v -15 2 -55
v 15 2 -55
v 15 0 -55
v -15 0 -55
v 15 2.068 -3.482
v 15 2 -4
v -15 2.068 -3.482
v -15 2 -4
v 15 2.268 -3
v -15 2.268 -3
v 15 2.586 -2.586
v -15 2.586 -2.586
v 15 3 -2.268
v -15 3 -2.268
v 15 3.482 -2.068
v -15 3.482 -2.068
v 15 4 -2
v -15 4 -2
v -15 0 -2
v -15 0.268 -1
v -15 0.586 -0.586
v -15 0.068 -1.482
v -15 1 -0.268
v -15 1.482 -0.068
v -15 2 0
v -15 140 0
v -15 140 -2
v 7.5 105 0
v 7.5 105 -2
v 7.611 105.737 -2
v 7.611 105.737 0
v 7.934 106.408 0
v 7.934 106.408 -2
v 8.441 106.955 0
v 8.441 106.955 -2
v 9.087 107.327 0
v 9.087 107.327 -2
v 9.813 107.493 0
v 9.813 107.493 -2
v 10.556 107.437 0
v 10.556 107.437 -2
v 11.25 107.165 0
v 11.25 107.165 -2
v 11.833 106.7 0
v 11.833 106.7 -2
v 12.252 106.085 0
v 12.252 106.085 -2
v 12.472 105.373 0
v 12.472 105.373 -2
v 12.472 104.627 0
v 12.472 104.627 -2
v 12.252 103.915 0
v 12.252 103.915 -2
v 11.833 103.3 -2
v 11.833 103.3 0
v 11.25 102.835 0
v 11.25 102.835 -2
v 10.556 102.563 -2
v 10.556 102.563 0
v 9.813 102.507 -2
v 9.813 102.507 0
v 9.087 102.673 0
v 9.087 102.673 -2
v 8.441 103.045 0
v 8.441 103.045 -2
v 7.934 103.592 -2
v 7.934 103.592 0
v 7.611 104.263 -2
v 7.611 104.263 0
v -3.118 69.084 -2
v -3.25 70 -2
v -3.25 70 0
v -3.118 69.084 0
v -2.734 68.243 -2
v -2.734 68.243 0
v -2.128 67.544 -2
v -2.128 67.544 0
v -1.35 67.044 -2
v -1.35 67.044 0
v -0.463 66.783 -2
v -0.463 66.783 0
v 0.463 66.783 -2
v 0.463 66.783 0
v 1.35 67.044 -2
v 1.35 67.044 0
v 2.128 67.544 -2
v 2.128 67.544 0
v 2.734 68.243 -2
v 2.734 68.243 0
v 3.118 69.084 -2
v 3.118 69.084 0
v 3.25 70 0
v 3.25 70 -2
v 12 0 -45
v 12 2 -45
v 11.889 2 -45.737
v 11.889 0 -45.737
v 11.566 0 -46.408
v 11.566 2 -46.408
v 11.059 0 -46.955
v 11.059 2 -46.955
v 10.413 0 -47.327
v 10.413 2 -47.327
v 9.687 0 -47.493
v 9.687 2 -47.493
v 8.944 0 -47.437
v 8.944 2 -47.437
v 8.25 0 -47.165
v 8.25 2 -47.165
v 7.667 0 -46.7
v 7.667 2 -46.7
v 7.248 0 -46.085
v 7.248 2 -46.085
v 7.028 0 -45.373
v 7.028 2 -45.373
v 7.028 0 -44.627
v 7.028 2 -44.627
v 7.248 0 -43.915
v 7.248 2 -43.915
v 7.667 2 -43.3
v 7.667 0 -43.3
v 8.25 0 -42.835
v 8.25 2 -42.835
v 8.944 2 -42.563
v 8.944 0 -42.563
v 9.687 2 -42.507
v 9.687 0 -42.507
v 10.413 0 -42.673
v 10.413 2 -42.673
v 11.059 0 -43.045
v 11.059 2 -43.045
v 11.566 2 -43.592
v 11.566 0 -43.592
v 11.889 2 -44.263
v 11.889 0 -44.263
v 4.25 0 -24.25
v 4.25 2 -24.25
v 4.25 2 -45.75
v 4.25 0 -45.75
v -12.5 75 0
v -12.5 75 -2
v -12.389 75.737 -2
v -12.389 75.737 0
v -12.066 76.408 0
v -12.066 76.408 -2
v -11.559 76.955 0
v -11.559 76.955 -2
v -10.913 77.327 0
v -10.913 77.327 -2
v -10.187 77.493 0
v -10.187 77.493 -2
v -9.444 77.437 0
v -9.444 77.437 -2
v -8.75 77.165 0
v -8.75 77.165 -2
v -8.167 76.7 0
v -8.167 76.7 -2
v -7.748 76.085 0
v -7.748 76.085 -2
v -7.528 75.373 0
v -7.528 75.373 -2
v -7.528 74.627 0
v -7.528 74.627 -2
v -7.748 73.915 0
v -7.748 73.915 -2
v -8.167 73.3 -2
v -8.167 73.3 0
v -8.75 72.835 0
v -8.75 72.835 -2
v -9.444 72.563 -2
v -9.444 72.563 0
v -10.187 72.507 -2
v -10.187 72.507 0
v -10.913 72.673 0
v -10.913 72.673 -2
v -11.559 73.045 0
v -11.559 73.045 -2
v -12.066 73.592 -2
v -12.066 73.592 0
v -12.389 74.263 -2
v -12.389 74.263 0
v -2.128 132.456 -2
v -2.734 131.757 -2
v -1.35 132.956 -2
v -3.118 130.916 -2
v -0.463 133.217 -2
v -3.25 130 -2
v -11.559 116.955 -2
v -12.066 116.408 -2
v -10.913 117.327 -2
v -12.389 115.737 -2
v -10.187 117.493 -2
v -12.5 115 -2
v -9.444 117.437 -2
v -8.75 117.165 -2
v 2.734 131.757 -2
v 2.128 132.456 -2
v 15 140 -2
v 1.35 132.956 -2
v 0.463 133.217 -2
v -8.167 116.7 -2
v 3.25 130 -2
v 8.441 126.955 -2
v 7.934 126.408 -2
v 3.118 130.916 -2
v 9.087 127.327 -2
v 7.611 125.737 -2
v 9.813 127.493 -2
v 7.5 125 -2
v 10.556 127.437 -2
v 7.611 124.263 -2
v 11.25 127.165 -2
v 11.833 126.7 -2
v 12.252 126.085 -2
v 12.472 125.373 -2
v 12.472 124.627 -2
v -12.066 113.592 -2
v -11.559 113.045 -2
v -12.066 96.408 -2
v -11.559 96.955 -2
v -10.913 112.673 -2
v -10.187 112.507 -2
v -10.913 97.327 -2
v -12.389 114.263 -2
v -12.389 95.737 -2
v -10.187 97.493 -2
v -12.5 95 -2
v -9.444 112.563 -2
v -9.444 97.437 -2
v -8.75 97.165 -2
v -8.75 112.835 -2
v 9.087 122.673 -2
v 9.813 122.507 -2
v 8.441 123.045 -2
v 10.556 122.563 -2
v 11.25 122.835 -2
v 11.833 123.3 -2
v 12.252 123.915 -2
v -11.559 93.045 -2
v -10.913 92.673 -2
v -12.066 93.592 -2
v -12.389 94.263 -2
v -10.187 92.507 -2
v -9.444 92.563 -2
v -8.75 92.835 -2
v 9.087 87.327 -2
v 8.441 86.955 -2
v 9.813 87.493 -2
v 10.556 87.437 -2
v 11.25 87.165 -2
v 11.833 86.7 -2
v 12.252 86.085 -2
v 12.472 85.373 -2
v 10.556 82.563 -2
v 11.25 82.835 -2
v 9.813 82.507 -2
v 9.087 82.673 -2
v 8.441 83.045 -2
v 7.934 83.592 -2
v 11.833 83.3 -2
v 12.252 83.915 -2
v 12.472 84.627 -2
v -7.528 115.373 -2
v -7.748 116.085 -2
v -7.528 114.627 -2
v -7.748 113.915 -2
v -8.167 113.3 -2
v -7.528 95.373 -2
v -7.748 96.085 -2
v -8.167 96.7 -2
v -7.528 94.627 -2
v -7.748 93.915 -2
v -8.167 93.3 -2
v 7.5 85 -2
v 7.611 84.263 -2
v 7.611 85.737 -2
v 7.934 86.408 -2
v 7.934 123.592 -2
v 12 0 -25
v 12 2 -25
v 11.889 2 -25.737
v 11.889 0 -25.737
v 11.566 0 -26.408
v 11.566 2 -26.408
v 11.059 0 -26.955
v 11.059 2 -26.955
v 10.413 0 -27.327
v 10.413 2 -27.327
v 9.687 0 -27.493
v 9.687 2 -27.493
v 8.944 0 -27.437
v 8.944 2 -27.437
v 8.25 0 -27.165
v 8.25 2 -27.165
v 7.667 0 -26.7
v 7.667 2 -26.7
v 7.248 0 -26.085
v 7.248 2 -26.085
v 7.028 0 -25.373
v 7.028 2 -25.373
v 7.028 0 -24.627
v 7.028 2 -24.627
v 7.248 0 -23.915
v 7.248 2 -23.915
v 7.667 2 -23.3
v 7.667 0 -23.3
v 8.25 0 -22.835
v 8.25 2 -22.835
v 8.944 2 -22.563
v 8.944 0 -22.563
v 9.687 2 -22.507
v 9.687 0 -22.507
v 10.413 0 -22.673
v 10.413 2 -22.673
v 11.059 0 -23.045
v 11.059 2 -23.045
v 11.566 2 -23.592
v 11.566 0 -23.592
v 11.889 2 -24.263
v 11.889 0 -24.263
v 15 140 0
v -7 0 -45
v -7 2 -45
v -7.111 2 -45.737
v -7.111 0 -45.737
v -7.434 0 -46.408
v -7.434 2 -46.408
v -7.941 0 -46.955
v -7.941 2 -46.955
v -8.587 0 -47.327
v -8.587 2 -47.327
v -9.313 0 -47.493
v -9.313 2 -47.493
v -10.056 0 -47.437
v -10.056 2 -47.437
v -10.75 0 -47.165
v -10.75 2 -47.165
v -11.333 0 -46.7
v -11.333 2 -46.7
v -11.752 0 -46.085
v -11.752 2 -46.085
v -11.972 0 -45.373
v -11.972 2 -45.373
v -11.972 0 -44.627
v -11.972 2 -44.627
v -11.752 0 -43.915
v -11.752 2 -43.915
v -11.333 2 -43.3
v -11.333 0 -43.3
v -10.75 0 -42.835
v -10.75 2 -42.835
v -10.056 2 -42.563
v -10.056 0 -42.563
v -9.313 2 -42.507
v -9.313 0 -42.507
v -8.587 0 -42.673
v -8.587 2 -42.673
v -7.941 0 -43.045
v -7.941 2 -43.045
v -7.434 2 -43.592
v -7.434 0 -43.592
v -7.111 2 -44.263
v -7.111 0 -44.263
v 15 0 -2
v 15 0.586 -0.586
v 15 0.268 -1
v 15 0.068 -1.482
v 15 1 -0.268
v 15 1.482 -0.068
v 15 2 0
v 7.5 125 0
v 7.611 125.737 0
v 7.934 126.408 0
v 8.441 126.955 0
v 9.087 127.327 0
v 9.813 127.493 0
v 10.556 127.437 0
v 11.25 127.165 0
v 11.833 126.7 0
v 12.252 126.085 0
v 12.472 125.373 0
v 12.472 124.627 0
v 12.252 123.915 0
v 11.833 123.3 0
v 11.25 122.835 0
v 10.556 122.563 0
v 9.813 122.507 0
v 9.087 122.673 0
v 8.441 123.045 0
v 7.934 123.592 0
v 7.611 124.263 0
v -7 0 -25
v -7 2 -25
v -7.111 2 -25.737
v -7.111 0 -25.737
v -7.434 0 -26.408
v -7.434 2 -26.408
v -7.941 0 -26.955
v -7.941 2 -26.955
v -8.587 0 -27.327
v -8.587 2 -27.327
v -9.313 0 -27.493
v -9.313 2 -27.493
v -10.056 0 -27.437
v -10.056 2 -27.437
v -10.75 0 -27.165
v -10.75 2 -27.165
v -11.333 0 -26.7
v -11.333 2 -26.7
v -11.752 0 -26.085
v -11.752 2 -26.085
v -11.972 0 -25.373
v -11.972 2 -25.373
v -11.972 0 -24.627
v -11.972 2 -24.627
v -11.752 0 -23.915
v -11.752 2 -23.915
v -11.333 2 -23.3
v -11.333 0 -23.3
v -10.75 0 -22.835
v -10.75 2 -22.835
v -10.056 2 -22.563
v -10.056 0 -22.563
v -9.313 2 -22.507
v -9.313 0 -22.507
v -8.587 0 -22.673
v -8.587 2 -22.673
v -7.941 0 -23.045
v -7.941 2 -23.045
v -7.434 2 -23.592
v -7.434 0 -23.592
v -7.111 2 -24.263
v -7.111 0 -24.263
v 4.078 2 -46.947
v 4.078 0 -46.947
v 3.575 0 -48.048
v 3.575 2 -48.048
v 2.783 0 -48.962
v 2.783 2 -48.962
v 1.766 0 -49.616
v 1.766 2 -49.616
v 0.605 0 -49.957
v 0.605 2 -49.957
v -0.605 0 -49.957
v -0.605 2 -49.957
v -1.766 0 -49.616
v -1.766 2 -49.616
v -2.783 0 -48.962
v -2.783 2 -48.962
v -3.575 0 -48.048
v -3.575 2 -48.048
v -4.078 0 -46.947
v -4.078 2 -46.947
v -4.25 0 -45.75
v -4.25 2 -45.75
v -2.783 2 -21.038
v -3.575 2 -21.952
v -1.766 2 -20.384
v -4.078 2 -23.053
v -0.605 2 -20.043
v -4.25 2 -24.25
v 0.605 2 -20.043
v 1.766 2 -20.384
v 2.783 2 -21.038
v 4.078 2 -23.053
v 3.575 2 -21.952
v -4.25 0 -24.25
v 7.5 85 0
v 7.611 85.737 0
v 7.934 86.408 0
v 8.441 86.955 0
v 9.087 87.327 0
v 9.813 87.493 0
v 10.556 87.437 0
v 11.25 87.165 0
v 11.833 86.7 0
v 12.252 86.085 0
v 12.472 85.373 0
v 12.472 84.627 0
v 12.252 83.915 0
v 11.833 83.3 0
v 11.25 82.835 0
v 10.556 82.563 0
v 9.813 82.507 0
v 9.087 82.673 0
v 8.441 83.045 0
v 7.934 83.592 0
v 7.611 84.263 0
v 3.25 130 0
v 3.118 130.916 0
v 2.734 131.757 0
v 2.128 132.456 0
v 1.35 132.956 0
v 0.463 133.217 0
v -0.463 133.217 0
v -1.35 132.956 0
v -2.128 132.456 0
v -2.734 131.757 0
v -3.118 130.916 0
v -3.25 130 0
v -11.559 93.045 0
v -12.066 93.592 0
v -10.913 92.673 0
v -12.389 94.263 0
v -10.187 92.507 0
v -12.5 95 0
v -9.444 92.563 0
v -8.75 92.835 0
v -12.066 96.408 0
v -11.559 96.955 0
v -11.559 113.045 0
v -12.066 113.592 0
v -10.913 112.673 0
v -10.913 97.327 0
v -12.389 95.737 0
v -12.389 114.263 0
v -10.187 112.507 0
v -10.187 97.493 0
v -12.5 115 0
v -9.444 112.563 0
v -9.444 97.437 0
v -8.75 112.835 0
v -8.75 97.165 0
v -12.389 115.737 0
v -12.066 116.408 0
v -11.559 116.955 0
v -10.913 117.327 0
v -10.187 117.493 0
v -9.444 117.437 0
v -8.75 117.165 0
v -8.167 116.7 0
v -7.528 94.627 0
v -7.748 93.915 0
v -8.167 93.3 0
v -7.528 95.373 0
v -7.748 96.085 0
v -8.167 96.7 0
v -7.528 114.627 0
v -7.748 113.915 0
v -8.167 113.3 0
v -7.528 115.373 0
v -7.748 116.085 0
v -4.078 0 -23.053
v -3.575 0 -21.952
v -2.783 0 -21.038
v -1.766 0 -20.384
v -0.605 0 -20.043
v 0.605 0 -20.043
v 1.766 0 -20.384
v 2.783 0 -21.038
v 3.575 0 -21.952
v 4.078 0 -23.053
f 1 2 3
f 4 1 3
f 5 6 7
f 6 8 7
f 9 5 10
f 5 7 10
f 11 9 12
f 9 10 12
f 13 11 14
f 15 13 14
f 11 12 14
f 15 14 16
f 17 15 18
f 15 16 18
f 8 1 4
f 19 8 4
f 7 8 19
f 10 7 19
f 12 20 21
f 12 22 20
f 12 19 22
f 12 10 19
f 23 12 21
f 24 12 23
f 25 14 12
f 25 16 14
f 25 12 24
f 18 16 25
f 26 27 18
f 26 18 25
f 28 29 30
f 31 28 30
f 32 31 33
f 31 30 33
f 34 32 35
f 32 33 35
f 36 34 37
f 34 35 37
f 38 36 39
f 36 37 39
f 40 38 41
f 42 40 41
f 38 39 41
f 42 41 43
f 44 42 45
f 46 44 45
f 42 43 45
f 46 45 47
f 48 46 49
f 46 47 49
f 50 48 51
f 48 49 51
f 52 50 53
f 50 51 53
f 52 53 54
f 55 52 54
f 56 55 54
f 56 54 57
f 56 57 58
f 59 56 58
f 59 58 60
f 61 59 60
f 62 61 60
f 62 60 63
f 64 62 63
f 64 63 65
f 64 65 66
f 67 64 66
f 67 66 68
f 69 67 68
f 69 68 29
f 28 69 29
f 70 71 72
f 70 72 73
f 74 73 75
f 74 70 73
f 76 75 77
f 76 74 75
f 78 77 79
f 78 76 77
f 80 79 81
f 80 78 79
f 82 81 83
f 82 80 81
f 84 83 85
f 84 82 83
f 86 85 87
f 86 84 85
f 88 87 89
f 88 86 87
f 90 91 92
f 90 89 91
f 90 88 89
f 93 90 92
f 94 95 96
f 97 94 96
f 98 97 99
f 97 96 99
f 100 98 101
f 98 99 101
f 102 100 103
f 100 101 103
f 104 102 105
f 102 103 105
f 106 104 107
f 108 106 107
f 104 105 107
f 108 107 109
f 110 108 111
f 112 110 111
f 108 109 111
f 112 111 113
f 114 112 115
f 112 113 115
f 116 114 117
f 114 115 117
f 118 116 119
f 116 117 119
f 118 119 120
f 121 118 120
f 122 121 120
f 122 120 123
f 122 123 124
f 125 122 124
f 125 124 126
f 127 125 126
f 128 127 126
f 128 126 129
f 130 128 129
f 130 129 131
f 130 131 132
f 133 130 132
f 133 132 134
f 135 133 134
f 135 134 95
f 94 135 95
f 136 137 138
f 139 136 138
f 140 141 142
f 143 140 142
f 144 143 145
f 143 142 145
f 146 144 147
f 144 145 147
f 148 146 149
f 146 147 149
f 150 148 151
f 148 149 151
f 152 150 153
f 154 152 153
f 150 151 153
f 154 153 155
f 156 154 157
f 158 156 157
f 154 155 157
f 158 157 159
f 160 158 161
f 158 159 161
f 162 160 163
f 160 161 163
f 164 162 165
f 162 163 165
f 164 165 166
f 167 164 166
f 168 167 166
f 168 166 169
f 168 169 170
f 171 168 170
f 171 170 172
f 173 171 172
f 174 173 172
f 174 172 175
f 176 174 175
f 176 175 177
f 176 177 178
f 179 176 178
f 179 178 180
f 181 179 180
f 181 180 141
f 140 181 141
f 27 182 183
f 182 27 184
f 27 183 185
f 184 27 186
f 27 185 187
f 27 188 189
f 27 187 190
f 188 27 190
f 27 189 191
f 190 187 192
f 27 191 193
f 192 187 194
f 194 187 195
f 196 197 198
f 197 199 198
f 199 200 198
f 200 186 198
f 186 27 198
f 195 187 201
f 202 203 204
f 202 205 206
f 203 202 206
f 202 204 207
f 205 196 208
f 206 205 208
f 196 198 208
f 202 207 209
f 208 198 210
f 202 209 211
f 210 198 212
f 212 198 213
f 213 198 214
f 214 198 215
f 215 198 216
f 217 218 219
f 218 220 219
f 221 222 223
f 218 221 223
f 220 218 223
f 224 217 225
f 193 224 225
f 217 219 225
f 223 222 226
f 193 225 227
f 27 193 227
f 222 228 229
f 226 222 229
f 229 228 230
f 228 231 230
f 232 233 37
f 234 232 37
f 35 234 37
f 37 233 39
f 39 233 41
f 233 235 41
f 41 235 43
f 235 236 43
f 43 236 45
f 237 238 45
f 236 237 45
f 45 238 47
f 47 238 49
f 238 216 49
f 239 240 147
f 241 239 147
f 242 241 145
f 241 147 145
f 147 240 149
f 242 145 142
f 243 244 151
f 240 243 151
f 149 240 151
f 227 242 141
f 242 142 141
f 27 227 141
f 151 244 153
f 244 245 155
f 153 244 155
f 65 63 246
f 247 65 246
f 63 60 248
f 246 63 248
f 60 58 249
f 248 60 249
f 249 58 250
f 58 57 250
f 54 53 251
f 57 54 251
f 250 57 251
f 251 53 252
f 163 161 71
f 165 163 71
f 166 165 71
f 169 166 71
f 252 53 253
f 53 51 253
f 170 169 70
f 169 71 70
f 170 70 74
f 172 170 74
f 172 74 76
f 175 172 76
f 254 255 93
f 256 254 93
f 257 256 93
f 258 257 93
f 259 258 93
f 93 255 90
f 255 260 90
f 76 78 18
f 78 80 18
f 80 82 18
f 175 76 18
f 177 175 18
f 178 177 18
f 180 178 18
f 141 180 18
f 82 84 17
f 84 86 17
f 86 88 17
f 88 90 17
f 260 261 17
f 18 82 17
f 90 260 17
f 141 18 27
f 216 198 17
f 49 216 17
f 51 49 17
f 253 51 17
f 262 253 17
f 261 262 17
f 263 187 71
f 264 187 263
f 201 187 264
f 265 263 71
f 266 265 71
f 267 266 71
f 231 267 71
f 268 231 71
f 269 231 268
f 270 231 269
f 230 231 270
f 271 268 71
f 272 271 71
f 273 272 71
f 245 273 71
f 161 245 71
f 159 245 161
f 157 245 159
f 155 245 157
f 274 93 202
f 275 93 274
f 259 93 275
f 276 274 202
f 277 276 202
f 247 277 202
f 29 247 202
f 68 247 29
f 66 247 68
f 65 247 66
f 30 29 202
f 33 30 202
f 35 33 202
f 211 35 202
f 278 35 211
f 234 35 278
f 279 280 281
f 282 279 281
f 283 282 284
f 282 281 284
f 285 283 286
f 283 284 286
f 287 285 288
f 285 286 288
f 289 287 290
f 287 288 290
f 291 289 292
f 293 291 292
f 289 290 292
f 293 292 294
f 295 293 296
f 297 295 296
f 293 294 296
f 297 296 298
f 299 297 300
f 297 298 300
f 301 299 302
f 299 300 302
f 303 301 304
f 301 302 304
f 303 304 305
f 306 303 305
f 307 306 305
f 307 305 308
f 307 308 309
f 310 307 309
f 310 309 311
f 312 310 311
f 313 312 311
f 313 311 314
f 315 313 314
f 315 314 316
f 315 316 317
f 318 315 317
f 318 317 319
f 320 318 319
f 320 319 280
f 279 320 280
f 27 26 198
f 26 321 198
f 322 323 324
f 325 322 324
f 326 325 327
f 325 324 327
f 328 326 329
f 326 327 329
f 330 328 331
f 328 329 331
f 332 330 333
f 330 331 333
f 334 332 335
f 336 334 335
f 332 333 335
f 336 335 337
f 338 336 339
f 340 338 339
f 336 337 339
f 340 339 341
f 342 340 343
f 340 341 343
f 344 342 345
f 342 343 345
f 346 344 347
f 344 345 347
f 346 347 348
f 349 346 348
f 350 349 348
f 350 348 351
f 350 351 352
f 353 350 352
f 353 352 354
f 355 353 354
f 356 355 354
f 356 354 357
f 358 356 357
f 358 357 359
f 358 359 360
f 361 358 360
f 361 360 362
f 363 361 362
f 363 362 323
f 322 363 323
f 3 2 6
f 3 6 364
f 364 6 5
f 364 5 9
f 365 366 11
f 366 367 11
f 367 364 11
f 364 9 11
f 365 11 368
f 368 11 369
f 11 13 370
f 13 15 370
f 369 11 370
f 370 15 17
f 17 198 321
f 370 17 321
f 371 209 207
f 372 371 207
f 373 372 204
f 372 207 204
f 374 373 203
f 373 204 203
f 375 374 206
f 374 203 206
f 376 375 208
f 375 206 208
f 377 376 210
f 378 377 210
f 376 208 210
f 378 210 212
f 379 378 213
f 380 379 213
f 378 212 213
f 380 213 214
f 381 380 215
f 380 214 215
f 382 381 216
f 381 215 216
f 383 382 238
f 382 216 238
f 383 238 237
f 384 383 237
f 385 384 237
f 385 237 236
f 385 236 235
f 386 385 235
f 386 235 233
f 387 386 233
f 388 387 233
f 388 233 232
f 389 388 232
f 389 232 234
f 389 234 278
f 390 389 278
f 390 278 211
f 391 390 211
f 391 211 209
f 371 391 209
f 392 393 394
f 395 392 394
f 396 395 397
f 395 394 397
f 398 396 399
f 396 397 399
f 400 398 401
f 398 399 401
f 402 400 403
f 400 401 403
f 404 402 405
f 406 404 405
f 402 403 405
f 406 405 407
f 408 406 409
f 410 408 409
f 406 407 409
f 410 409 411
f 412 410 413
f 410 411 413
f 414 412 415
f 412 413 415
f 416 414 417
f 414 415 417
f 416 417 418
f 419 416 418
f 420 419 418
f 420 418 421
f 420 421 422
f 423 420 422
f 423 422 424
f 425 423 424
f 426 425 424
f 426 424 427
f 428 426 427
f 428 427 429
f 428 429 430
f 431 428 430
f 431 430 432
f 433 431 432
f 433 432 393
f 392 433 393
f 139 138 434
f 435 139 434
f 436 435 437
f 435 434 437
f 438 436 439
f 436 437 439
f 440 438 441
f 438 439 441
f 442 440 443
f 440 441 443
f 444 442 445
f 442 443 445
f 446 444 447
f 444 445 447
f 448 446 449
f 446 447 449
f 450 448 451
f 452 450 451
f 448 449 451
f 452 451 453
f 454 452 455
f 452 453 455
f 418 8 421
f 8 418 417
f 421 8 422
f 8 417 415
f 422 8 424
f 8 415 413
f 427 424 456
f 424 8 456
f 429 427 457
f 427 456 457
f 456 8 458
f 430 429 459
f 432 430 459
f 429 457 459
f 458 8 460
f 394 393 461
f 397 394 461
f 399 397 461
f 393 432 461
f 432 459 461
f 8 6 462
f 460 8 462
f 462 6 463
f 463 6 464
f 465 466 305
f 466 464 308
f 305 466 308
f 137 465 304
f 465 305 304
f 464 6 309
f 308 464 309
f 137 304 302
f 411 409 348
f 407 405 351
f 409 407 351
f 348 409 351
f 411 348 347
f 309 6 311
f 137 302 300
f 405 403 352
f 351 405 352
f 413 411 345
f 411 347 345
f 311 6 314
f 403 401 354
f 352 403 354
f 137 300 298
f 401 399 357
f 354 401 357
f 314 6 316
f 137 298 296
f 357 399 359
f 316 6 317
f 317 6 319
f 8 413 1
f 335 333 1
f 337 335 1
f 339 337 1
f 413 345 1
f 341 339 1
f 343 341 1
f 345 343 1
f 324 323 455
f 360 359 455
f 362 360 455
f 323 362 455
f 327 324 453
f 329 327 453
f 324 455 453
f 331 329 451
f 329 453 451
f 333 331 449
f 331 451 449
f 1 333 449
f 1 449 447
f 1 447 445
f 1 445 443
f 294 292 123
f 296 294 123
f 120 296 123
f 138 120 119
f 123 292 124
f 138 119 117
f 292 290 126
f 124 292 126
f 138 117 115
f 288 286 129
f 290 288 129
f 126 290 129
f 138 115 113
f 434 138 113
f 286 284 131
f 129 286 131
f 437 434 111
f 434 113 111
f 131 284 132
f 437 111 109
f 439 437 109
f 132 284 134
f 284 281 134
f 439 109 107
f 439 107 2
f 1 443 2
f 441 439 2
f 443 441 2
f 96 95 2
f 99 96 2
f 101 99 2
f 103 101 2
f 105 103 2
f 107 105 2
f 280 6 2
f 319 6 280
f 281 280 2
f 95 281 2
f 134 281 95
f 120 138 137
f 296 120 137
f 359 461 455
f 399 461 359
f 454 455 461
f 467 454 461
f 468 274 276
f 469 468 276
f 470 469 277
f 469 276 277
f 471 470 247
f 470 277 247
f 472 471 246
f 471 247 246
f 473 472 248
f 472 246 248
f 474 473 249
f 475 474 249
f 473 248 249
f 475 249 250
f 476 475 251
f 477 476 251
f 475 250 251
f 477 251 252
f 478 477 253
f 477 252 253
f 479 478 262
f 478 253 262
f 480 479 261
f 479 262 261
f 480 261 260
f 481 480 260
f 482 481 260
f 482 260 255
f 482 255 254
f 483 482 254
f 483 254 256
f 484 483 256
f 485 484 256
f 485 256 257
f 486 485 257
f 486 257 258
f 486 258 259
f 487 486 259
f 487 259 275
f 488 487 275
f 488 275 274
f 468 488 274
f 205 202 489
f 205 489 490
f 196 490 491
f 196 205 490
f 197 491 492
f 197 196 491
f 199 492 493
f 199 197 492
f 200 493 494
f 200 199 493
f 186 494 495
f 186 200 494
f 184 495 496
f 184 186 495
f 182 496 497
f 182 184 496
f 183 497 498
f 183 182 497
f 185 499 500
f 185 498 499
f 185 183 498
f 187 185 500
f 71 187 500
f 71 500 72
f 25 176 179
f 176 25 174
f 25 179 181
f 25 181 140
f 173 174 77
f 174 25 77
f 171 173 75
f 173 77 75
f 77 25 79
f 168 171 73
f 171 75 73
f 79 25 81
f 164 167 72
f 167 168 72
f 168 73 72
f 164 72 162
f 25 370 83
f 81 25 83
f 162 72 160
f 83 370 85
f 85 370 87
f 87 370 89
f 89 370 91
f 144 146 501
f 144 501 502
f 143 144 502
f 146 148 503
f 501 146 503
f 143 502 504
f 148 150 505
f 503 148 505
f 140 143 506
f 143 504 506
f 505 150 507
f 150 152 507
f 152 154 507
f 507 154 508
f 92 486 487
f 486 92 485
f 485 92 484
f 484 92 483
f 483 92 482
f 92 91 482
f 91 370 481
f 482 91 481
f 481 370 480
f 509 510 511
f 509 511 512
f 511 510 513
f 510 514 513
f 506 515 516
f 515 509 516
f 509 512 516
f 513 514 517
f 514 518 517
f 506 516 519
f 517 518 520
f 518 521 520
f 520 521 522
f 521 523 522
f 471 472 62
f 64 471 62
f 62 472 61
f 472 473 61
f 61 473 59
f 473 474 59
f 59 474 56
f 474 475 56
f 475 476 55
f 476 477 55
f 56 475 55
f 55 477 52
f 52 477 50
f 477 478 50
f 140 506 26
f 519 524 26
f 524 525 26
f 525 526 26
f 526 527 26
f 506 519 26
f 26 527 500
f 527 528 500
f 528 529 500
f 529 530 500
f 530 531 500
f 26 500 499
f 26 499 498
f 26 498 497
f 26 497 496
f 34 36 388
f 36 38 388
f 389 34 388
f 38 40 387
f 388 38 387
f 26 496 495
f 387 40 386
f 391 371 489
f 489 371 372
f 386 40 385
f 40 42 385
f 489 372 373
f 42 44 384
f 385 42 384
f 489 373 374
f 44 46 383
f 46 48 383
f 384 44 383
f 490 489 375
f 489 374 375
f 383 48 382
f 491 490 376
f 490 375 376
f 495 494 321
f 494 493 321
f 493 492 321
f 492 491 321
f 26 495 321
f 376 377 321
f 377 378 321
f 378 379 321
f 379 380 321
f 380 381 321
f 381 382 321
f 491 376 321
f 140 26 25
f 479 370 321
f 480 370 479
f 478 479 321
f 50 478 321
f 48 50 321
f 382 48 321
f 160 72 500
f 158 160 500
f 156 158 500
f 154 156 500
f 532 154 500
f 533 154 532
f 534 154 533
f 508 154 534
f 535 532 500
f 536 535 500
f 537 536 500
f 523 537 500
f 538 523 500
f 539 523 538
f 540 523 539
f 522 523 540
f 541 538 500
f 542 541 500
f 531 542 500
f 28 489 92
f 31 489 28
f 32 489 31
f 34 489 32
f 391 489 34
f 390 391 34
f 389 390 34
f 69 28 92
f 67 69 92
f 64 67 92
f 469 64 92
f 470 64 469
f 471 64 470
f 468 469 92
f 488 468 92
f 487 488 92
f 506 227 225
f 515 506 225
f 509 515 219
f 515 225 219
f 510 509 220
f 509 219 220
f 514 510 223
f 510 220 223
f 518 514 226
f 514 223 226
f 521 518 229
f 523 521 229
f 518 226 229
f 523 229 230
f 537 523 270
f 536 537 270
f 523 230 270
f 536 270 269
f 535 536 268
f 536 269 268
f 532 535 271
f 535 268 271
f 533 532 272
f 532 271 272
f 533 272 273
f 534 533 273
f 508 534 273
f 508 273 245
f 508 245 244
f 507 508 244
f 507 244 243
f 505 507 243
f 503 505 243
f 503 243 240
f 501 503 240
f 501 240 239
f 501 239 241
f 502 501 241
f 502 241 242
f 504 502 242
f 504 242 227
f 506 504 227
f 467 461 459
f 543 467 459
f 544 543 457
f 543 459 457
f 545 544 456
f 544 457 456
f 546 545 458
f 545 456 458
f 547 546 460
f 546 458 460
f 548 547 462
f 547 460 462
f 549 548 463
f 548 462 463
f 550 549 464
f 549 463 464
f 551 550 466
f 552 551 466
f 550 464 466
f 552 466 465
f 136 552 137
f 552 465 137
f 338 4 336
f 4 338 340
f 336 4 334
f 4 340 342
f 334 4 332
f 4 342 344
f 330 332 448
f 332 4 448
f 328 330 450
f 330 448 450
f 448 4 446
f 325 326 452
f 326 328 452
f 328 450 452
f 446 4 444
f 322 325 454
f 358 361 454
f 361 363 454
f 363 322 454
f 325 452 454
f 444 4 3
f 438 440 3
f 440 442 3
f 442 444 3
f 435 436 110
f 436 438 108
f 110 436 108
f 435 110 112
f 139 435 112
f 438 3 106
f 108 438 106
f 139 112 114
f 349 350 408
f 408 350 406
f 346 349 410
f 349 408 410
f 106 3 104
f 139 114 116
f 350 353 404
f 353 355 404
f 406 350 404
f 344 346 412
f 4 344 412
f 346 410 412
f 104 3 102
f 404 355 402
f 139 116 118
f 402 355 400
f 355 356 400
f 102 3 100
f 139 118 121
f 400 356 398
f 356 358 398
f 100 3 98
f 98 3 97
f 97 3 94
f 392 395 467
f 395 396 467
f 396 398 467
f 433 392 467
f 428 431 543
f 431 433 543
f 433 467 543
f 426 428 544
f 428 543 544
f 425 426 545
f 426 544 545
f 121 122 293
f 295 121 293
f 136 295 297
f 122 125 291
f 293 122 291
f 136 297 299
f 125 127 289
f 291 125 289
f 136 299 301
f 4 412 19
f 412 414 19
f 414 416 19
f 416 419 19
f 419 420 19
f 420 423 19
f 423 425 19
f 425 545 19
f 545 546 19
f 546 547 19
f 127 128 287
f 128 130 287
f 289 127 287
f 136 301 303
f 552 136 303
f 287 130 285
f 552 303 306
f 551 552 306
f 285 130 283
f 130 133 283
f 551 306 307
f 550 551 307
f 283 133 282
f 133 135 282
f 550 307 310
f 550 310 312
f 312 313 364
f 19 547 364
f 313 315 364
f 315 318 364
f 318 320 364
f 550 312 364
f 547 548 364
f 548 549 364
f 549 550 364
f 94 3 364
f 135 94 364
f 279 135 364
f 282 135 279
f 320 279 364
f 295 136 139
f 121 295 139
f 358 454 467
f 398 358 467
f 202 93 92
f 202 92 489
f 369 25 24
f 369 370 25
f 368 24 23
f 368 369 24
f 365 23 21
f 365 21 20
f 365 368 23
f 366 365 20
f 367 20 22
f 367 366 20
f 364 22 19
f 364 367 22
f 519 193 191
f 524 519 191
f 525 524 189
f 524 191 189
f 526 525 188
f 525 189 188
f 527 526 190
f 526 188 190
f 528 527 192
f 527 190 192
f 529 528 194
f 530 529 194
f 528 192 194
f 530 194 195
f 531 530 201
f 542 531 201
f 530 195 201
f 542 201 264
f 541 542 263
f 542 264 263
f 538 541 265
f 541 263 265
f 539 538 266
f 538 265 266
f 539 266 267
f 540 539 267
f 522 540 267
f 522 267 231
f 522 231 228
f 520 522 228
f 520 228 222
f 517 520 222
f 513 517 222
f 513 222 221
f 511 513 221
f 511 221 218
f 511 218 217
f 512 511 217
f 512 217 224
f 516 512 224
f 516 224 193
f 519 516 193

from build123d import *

# Parameters (mm, degrees)
BOSS_EXTRU_1_DEPTH      = 15
CONG_1_R                = 2
ENL_V_MAT_EXTRU_1_REACH = 4
ESQUISSE2_R             = 2.5
ENL_V_MAT_EXTRU_2_REACH = 4
ESQUISSE4_R             = 2.5


with BuildPart() as part:
    # Esquisse1 → Boss.-Extru.1 (new body, symmetric)
    with BuildSketch(Plane(origin=(0, 0, 0), x_dir=(0, 0, -1), z_dir=(1, 0, 0))):
        Polygon((0, 0), (0, 140), (2, 140), (2, 2), (55, 2), (55, 0), align=None)
    extrude(amount=BOSS_EXTRU_1_DEPTH, both=True)

    # Congé1
    cong_1_edges = [part.edges().sort_by_distance(p)[0] for p in [
        (0, 0, 0),
        (0, 2, -2),
    ]]
    fillet(cong_1_edges, radius=CONG_1_R)

    # Esquisse2 → Enlèv. mat.-Extru.1 (cut, up to next)
    with BuildSketch(Plane(origin=(0, 2, 0), x_dir=(1, 0, 0), z_dir=(0, 1, 0)), mode=Mode.PRIVATE) as enl_v_mat_extru_1_sk1:
        with BuildLine():
            Line((4.25, 24.25), (4.25, 45.75))
            ThreePointArc((4.25, 45.75), (0, 50), (-4.25, 45.75))
            Line((-4.25, 45.75), (-4.25, 24.25))
            ThreePointArc((-4.25, 24.25), (0, 20), (4.25, 24.25))
        make_face()
    enl_v_mat_extru_1_tool1 = extrude(enl_v_mat_extru_1_sk1.sketch, amount=-ENL_V_MAT_EXTRU_1_REACH, mode=Mode.PRIVATE) & part.part
    add(enl_v_mat_extru_1_tool1.solids().sort_by_distance((0, 2, -35))[0], mode=Mode.SUBTRACT)
    # Esquisse2 → Enlèv. mat.-Extru.1 (cut, up to next)
    with BuildSketch(Plane(origin=(0, 2, 0), x_dir=(1, 0, 0), z_dir=(0, 1, 0)), mode=Mode.PRIVATE) as enl_v_mat_extru_1_sk2:
        with Locations((-9.5, 25)):
            Circle(ESQUISSE2_R)
    enl_v_mat_extru_1_tool2 = extrude(enl_v_mat_extru_1_sk2.sketch, amount=-ENL_V_MAT_EXTRU_1_REACH, mode=Mode.PRIVATE) & part.part
    add(enl_v_mat_extru_1_tool2.solids().sort_by_distance((-9.5, 2, -25))[0], mode=Mode.SUBTRACT)
    # Esquisse2 → Enlèv. mat.-Extru.1 (cut, up to next)
    with BuildSketch(Plane(origin=(0, 2, 0), x_dir=(1, 0, 0), z_dir=(0, 1, 0)), mode=Mode.PRIVATE) as enl_v_mat_extru_1_sk3:
        with Locations((-9.5, 45)):
            Circle(ESQUISSE2_R)
    enl_v_mat_extru_1_tool3 = extrude(enl_v_mat_extru_1_sk3.sketch, amount=-ENL_V_MAT_EXTRU_1_REACH, mode=Mode.PRIVATE) & part.part
    add(enl_v_mat_extru_1_tool3.solids().sort_by_distance((-9.5, 2, -45))[0], mode=Mode.SUBTRACT)
    # Esquisse2 → Enlèv. mat.-Extru.1 (cut, up to next)
    with BuildSketch(Plane(origin=(0, 2, 0), x_dir=(1, 0, 0), z_dir=(0, 1, 0)), mode=Mode.PRIVATE) as enl_v_mat_extru_1_sk4:
        with Locations((9.5, 45)):
            Circle(ESQUISSE2_R)
    enl_v_mat_extru_1_tool4 = extrude(enl_v_mat_extru_1_sk4.sketch, amount=-ENL_V_MAT_EXTRU_1_REACH, mode=Mode.PRIVATE) & part.part
    add(enl_v_mat_extru_1_tool4.solids().sort_by_distance((9.5, 2, -45))[0], mode=Mode.SUBTRACT)
    # Esquisse2 → Enlèv. mat.-Extru.1 (cut, up to next)
    with BuildSketch(Plane(origin=(0, 2, 0), x_dir=(1, 0, 0), z_dir=(0, 1, 0)), mode=Mode.PRIVATE) as enl_v_mat_extru_1_sk5:
        with Locations((9.5, 25)):
            Circle(ESQUISSE2_R)
    enl_v_mat_extru_1_tool5 = extrude(enl_v_mat_extru_1_sk5.sketch, amount=-ENL_V_MAT_EXTRU_1_REACH, mode=Mode.PRIVATE) & part.part
    add(enl_v_mat_extru_1_tool5.solids().sort_by_distance((9.5, 2, -25))[0], mode=Mode.SUBTRACT)

    # Esquisse4 → Enlèv. mat.-Extru.2 (cut, up to next)
    with BuildSketch(Plane(origin=(0, 0, -2), x_dir=(-1, 0, 0), z_dir=(0, 0, -1)), mode=Mode.PRIVATE) as enl_v_mat_extru_2_sk1:
        with Locations((-10, 125)):
            Circle(ESQUISSE4_R)
    enl_v_mat_extru_2_tool1 = extrude(enl_v_mat_extru_2_sk1.sketch, amount=-ENL_V_MAT_EXTRU_2_REACH, mode=Mode.PRIVATE) & part.part
    add(enl_v_mat_extru_2_tool1.solids().sort_by_distance((10, 125, -2))[0], mode=Mode.SUBTRACT)
    # Esquisse4 → Enlèv. mat.-Extru.2 (cut, up to next)
    with BuildSketch(Plane(origin=(0, 0, -2), x_dir=(-1, 0, 0), z_dir=(0, 0, -1)), mode=Mode.PRIVATE) as enl_v_mat_extru_2_sk2:
        with Locations((-10, 105)):
            Circle(ESQUISSE4_R)
    enl_v_mat_extru_2_tool2 = extrude(enl_v_mat_extru_2_sk2.sketch, amount=-ENL_V_MAT_EXTRU_2_REACH, mode=Mode.PRIVATE) & part.part
    add(enl_v_mat_extru_2_tool2.solids().sort_by_distance((10, 105, -2))[0], mode=Mode.SUBTRACT)
    # Esquisse4 → Enlèv. mat.-Extru.2 (cut, up to next)
    with BuildSketch(Plane(origin=(0, 0, -2), x_dir=(-1, 0, 0), z_dir=(0, 0, -1)), mode=Mode.PRIVATE) as enl_v_mat_extru_2_sk3:
        with Locations((-10, 85)):
            Circle(ESQUISSE4_R)
    enl_v_mat_extru_2_tool3 = extrude(enl_v_mat_extru_2_sk3.sketch, amount=-ENL_V_MAT_EXTRU_2_REACH, mode=Mode.PRIVATE) & part.part
    add(enl_v_mat_extru_2_tool3.solids().sort_by_distance((10, 85, -2))[0], mode=Mode.SUBTRACT)
    # Esquisse4 → Enlèv. mat.-Extru.2 (cut, up to next)
    with BuildSketch(Plane(origin=(0, 0, -2), x_dir=(-1, 0, 0), z_dir=(0, 0, -1)), mode=Mode.PRIVATE) as enl_v_mat_extru_2_sk4:
        with Locations((10, 115)):
            Circle(ESQUISSE4_R)
    enl_v_mat_extru_2_tool4 = extrude(enl_v_mat_extru_2_sk4.sketch, amount=-ENL_V_MAT_EXTRU_2_REACH, mode=Mode.PRIVATE) & part.part
    add(enl_v_mat_extru_2_tool4.solids().sort_by_distance((-10, 115, -2))[0], mode=Mode.SUBTRACT)
    # Esquisse4 → Enlèv. mat.-Extru.2 (cut, up to next)
    with BuildSketch(Plane(origin=(0, 0, -2), x_dir=(-1, 0, 0), z_dir=(0, 0, -1)), mode=Mode.PRIVATE) as enl_v_mat_extru_2_sk5:
        with Locations((10, 95)):
            Circle(ESQUISSE4_R)
    enl_v_mat_extru_2_tool5 = extrude(enl_v_mat_extru_2_sk5.sketch, amount=-ENL_V_MAT_EXTRU_2_REACH, mode=Mode.PRIVATE) & part.part
    add(enl_v_mat_extru_2_tool5.solids().sort_by_distance((-10, 95, -2))[0], mode=Mode.SUBTRACT)
    # Esquisse4 → Enlèv. mat.-Extru.2 (cut, up to next)
    with BuildSketch(Plane(origin=(0, 0, -2), x_dir=(-1, 0, 0), z_dir=(0, 0, -1)), mode=Mode.PRIVATE) as enl_v_mat_extru_2_sk6:
        with Locations((10, 75)):
            Circle(ESQUISSE4_R)
    enl_v_mat_extru_2_tool6 = extrude(enl_v_mat_extru_2_sk6.sketch, amount=-ENL_V_MAT_EXTRU_2_REACH, mode=Mode.PRIVATE) & part.part
    add(enl_v_mat_extru_2_tool6.solids().sort_by_distance((-10, 75, -2))[0], mode=Mode.SUBTRACT)
    # Esquisse4 → Enlèv. mat.-Extru.2 (cut, up to next)
    with BuildSketch(Plane(origin=(0, 0, -2), x_dir=(-1, 0, 0), z_dir=(0, 0, -1)), mode=Mode.PRIVATE) as enl_v_mat_extru_2_sk7:
        with BuildLine():
            Line((3.25, 130), (3.25, 70))
            ThreePointArc((3.25, 70), (0, 66.75), (-3.25, 70))
            Line((-3.25, 70), (-3.25, 130))
            ThreePointArc((-3.25, 130), (0, 133.25), (3.25, 130))
        make_face()
    enl_v_mat_extru_2_tool7 = extrude(enl_v_mat_extru_2_sk7.sketch, amount=-ENL_V_MAT_EXTRU_2_REACH, mode=Mode.PRIVATE) & part.part
    add(enl_v_mat_extru_2_tool7.solids().sort_by_distance((0, 100, -2))[0], mode=Mode.SUBTRACT)


solid = part.part
